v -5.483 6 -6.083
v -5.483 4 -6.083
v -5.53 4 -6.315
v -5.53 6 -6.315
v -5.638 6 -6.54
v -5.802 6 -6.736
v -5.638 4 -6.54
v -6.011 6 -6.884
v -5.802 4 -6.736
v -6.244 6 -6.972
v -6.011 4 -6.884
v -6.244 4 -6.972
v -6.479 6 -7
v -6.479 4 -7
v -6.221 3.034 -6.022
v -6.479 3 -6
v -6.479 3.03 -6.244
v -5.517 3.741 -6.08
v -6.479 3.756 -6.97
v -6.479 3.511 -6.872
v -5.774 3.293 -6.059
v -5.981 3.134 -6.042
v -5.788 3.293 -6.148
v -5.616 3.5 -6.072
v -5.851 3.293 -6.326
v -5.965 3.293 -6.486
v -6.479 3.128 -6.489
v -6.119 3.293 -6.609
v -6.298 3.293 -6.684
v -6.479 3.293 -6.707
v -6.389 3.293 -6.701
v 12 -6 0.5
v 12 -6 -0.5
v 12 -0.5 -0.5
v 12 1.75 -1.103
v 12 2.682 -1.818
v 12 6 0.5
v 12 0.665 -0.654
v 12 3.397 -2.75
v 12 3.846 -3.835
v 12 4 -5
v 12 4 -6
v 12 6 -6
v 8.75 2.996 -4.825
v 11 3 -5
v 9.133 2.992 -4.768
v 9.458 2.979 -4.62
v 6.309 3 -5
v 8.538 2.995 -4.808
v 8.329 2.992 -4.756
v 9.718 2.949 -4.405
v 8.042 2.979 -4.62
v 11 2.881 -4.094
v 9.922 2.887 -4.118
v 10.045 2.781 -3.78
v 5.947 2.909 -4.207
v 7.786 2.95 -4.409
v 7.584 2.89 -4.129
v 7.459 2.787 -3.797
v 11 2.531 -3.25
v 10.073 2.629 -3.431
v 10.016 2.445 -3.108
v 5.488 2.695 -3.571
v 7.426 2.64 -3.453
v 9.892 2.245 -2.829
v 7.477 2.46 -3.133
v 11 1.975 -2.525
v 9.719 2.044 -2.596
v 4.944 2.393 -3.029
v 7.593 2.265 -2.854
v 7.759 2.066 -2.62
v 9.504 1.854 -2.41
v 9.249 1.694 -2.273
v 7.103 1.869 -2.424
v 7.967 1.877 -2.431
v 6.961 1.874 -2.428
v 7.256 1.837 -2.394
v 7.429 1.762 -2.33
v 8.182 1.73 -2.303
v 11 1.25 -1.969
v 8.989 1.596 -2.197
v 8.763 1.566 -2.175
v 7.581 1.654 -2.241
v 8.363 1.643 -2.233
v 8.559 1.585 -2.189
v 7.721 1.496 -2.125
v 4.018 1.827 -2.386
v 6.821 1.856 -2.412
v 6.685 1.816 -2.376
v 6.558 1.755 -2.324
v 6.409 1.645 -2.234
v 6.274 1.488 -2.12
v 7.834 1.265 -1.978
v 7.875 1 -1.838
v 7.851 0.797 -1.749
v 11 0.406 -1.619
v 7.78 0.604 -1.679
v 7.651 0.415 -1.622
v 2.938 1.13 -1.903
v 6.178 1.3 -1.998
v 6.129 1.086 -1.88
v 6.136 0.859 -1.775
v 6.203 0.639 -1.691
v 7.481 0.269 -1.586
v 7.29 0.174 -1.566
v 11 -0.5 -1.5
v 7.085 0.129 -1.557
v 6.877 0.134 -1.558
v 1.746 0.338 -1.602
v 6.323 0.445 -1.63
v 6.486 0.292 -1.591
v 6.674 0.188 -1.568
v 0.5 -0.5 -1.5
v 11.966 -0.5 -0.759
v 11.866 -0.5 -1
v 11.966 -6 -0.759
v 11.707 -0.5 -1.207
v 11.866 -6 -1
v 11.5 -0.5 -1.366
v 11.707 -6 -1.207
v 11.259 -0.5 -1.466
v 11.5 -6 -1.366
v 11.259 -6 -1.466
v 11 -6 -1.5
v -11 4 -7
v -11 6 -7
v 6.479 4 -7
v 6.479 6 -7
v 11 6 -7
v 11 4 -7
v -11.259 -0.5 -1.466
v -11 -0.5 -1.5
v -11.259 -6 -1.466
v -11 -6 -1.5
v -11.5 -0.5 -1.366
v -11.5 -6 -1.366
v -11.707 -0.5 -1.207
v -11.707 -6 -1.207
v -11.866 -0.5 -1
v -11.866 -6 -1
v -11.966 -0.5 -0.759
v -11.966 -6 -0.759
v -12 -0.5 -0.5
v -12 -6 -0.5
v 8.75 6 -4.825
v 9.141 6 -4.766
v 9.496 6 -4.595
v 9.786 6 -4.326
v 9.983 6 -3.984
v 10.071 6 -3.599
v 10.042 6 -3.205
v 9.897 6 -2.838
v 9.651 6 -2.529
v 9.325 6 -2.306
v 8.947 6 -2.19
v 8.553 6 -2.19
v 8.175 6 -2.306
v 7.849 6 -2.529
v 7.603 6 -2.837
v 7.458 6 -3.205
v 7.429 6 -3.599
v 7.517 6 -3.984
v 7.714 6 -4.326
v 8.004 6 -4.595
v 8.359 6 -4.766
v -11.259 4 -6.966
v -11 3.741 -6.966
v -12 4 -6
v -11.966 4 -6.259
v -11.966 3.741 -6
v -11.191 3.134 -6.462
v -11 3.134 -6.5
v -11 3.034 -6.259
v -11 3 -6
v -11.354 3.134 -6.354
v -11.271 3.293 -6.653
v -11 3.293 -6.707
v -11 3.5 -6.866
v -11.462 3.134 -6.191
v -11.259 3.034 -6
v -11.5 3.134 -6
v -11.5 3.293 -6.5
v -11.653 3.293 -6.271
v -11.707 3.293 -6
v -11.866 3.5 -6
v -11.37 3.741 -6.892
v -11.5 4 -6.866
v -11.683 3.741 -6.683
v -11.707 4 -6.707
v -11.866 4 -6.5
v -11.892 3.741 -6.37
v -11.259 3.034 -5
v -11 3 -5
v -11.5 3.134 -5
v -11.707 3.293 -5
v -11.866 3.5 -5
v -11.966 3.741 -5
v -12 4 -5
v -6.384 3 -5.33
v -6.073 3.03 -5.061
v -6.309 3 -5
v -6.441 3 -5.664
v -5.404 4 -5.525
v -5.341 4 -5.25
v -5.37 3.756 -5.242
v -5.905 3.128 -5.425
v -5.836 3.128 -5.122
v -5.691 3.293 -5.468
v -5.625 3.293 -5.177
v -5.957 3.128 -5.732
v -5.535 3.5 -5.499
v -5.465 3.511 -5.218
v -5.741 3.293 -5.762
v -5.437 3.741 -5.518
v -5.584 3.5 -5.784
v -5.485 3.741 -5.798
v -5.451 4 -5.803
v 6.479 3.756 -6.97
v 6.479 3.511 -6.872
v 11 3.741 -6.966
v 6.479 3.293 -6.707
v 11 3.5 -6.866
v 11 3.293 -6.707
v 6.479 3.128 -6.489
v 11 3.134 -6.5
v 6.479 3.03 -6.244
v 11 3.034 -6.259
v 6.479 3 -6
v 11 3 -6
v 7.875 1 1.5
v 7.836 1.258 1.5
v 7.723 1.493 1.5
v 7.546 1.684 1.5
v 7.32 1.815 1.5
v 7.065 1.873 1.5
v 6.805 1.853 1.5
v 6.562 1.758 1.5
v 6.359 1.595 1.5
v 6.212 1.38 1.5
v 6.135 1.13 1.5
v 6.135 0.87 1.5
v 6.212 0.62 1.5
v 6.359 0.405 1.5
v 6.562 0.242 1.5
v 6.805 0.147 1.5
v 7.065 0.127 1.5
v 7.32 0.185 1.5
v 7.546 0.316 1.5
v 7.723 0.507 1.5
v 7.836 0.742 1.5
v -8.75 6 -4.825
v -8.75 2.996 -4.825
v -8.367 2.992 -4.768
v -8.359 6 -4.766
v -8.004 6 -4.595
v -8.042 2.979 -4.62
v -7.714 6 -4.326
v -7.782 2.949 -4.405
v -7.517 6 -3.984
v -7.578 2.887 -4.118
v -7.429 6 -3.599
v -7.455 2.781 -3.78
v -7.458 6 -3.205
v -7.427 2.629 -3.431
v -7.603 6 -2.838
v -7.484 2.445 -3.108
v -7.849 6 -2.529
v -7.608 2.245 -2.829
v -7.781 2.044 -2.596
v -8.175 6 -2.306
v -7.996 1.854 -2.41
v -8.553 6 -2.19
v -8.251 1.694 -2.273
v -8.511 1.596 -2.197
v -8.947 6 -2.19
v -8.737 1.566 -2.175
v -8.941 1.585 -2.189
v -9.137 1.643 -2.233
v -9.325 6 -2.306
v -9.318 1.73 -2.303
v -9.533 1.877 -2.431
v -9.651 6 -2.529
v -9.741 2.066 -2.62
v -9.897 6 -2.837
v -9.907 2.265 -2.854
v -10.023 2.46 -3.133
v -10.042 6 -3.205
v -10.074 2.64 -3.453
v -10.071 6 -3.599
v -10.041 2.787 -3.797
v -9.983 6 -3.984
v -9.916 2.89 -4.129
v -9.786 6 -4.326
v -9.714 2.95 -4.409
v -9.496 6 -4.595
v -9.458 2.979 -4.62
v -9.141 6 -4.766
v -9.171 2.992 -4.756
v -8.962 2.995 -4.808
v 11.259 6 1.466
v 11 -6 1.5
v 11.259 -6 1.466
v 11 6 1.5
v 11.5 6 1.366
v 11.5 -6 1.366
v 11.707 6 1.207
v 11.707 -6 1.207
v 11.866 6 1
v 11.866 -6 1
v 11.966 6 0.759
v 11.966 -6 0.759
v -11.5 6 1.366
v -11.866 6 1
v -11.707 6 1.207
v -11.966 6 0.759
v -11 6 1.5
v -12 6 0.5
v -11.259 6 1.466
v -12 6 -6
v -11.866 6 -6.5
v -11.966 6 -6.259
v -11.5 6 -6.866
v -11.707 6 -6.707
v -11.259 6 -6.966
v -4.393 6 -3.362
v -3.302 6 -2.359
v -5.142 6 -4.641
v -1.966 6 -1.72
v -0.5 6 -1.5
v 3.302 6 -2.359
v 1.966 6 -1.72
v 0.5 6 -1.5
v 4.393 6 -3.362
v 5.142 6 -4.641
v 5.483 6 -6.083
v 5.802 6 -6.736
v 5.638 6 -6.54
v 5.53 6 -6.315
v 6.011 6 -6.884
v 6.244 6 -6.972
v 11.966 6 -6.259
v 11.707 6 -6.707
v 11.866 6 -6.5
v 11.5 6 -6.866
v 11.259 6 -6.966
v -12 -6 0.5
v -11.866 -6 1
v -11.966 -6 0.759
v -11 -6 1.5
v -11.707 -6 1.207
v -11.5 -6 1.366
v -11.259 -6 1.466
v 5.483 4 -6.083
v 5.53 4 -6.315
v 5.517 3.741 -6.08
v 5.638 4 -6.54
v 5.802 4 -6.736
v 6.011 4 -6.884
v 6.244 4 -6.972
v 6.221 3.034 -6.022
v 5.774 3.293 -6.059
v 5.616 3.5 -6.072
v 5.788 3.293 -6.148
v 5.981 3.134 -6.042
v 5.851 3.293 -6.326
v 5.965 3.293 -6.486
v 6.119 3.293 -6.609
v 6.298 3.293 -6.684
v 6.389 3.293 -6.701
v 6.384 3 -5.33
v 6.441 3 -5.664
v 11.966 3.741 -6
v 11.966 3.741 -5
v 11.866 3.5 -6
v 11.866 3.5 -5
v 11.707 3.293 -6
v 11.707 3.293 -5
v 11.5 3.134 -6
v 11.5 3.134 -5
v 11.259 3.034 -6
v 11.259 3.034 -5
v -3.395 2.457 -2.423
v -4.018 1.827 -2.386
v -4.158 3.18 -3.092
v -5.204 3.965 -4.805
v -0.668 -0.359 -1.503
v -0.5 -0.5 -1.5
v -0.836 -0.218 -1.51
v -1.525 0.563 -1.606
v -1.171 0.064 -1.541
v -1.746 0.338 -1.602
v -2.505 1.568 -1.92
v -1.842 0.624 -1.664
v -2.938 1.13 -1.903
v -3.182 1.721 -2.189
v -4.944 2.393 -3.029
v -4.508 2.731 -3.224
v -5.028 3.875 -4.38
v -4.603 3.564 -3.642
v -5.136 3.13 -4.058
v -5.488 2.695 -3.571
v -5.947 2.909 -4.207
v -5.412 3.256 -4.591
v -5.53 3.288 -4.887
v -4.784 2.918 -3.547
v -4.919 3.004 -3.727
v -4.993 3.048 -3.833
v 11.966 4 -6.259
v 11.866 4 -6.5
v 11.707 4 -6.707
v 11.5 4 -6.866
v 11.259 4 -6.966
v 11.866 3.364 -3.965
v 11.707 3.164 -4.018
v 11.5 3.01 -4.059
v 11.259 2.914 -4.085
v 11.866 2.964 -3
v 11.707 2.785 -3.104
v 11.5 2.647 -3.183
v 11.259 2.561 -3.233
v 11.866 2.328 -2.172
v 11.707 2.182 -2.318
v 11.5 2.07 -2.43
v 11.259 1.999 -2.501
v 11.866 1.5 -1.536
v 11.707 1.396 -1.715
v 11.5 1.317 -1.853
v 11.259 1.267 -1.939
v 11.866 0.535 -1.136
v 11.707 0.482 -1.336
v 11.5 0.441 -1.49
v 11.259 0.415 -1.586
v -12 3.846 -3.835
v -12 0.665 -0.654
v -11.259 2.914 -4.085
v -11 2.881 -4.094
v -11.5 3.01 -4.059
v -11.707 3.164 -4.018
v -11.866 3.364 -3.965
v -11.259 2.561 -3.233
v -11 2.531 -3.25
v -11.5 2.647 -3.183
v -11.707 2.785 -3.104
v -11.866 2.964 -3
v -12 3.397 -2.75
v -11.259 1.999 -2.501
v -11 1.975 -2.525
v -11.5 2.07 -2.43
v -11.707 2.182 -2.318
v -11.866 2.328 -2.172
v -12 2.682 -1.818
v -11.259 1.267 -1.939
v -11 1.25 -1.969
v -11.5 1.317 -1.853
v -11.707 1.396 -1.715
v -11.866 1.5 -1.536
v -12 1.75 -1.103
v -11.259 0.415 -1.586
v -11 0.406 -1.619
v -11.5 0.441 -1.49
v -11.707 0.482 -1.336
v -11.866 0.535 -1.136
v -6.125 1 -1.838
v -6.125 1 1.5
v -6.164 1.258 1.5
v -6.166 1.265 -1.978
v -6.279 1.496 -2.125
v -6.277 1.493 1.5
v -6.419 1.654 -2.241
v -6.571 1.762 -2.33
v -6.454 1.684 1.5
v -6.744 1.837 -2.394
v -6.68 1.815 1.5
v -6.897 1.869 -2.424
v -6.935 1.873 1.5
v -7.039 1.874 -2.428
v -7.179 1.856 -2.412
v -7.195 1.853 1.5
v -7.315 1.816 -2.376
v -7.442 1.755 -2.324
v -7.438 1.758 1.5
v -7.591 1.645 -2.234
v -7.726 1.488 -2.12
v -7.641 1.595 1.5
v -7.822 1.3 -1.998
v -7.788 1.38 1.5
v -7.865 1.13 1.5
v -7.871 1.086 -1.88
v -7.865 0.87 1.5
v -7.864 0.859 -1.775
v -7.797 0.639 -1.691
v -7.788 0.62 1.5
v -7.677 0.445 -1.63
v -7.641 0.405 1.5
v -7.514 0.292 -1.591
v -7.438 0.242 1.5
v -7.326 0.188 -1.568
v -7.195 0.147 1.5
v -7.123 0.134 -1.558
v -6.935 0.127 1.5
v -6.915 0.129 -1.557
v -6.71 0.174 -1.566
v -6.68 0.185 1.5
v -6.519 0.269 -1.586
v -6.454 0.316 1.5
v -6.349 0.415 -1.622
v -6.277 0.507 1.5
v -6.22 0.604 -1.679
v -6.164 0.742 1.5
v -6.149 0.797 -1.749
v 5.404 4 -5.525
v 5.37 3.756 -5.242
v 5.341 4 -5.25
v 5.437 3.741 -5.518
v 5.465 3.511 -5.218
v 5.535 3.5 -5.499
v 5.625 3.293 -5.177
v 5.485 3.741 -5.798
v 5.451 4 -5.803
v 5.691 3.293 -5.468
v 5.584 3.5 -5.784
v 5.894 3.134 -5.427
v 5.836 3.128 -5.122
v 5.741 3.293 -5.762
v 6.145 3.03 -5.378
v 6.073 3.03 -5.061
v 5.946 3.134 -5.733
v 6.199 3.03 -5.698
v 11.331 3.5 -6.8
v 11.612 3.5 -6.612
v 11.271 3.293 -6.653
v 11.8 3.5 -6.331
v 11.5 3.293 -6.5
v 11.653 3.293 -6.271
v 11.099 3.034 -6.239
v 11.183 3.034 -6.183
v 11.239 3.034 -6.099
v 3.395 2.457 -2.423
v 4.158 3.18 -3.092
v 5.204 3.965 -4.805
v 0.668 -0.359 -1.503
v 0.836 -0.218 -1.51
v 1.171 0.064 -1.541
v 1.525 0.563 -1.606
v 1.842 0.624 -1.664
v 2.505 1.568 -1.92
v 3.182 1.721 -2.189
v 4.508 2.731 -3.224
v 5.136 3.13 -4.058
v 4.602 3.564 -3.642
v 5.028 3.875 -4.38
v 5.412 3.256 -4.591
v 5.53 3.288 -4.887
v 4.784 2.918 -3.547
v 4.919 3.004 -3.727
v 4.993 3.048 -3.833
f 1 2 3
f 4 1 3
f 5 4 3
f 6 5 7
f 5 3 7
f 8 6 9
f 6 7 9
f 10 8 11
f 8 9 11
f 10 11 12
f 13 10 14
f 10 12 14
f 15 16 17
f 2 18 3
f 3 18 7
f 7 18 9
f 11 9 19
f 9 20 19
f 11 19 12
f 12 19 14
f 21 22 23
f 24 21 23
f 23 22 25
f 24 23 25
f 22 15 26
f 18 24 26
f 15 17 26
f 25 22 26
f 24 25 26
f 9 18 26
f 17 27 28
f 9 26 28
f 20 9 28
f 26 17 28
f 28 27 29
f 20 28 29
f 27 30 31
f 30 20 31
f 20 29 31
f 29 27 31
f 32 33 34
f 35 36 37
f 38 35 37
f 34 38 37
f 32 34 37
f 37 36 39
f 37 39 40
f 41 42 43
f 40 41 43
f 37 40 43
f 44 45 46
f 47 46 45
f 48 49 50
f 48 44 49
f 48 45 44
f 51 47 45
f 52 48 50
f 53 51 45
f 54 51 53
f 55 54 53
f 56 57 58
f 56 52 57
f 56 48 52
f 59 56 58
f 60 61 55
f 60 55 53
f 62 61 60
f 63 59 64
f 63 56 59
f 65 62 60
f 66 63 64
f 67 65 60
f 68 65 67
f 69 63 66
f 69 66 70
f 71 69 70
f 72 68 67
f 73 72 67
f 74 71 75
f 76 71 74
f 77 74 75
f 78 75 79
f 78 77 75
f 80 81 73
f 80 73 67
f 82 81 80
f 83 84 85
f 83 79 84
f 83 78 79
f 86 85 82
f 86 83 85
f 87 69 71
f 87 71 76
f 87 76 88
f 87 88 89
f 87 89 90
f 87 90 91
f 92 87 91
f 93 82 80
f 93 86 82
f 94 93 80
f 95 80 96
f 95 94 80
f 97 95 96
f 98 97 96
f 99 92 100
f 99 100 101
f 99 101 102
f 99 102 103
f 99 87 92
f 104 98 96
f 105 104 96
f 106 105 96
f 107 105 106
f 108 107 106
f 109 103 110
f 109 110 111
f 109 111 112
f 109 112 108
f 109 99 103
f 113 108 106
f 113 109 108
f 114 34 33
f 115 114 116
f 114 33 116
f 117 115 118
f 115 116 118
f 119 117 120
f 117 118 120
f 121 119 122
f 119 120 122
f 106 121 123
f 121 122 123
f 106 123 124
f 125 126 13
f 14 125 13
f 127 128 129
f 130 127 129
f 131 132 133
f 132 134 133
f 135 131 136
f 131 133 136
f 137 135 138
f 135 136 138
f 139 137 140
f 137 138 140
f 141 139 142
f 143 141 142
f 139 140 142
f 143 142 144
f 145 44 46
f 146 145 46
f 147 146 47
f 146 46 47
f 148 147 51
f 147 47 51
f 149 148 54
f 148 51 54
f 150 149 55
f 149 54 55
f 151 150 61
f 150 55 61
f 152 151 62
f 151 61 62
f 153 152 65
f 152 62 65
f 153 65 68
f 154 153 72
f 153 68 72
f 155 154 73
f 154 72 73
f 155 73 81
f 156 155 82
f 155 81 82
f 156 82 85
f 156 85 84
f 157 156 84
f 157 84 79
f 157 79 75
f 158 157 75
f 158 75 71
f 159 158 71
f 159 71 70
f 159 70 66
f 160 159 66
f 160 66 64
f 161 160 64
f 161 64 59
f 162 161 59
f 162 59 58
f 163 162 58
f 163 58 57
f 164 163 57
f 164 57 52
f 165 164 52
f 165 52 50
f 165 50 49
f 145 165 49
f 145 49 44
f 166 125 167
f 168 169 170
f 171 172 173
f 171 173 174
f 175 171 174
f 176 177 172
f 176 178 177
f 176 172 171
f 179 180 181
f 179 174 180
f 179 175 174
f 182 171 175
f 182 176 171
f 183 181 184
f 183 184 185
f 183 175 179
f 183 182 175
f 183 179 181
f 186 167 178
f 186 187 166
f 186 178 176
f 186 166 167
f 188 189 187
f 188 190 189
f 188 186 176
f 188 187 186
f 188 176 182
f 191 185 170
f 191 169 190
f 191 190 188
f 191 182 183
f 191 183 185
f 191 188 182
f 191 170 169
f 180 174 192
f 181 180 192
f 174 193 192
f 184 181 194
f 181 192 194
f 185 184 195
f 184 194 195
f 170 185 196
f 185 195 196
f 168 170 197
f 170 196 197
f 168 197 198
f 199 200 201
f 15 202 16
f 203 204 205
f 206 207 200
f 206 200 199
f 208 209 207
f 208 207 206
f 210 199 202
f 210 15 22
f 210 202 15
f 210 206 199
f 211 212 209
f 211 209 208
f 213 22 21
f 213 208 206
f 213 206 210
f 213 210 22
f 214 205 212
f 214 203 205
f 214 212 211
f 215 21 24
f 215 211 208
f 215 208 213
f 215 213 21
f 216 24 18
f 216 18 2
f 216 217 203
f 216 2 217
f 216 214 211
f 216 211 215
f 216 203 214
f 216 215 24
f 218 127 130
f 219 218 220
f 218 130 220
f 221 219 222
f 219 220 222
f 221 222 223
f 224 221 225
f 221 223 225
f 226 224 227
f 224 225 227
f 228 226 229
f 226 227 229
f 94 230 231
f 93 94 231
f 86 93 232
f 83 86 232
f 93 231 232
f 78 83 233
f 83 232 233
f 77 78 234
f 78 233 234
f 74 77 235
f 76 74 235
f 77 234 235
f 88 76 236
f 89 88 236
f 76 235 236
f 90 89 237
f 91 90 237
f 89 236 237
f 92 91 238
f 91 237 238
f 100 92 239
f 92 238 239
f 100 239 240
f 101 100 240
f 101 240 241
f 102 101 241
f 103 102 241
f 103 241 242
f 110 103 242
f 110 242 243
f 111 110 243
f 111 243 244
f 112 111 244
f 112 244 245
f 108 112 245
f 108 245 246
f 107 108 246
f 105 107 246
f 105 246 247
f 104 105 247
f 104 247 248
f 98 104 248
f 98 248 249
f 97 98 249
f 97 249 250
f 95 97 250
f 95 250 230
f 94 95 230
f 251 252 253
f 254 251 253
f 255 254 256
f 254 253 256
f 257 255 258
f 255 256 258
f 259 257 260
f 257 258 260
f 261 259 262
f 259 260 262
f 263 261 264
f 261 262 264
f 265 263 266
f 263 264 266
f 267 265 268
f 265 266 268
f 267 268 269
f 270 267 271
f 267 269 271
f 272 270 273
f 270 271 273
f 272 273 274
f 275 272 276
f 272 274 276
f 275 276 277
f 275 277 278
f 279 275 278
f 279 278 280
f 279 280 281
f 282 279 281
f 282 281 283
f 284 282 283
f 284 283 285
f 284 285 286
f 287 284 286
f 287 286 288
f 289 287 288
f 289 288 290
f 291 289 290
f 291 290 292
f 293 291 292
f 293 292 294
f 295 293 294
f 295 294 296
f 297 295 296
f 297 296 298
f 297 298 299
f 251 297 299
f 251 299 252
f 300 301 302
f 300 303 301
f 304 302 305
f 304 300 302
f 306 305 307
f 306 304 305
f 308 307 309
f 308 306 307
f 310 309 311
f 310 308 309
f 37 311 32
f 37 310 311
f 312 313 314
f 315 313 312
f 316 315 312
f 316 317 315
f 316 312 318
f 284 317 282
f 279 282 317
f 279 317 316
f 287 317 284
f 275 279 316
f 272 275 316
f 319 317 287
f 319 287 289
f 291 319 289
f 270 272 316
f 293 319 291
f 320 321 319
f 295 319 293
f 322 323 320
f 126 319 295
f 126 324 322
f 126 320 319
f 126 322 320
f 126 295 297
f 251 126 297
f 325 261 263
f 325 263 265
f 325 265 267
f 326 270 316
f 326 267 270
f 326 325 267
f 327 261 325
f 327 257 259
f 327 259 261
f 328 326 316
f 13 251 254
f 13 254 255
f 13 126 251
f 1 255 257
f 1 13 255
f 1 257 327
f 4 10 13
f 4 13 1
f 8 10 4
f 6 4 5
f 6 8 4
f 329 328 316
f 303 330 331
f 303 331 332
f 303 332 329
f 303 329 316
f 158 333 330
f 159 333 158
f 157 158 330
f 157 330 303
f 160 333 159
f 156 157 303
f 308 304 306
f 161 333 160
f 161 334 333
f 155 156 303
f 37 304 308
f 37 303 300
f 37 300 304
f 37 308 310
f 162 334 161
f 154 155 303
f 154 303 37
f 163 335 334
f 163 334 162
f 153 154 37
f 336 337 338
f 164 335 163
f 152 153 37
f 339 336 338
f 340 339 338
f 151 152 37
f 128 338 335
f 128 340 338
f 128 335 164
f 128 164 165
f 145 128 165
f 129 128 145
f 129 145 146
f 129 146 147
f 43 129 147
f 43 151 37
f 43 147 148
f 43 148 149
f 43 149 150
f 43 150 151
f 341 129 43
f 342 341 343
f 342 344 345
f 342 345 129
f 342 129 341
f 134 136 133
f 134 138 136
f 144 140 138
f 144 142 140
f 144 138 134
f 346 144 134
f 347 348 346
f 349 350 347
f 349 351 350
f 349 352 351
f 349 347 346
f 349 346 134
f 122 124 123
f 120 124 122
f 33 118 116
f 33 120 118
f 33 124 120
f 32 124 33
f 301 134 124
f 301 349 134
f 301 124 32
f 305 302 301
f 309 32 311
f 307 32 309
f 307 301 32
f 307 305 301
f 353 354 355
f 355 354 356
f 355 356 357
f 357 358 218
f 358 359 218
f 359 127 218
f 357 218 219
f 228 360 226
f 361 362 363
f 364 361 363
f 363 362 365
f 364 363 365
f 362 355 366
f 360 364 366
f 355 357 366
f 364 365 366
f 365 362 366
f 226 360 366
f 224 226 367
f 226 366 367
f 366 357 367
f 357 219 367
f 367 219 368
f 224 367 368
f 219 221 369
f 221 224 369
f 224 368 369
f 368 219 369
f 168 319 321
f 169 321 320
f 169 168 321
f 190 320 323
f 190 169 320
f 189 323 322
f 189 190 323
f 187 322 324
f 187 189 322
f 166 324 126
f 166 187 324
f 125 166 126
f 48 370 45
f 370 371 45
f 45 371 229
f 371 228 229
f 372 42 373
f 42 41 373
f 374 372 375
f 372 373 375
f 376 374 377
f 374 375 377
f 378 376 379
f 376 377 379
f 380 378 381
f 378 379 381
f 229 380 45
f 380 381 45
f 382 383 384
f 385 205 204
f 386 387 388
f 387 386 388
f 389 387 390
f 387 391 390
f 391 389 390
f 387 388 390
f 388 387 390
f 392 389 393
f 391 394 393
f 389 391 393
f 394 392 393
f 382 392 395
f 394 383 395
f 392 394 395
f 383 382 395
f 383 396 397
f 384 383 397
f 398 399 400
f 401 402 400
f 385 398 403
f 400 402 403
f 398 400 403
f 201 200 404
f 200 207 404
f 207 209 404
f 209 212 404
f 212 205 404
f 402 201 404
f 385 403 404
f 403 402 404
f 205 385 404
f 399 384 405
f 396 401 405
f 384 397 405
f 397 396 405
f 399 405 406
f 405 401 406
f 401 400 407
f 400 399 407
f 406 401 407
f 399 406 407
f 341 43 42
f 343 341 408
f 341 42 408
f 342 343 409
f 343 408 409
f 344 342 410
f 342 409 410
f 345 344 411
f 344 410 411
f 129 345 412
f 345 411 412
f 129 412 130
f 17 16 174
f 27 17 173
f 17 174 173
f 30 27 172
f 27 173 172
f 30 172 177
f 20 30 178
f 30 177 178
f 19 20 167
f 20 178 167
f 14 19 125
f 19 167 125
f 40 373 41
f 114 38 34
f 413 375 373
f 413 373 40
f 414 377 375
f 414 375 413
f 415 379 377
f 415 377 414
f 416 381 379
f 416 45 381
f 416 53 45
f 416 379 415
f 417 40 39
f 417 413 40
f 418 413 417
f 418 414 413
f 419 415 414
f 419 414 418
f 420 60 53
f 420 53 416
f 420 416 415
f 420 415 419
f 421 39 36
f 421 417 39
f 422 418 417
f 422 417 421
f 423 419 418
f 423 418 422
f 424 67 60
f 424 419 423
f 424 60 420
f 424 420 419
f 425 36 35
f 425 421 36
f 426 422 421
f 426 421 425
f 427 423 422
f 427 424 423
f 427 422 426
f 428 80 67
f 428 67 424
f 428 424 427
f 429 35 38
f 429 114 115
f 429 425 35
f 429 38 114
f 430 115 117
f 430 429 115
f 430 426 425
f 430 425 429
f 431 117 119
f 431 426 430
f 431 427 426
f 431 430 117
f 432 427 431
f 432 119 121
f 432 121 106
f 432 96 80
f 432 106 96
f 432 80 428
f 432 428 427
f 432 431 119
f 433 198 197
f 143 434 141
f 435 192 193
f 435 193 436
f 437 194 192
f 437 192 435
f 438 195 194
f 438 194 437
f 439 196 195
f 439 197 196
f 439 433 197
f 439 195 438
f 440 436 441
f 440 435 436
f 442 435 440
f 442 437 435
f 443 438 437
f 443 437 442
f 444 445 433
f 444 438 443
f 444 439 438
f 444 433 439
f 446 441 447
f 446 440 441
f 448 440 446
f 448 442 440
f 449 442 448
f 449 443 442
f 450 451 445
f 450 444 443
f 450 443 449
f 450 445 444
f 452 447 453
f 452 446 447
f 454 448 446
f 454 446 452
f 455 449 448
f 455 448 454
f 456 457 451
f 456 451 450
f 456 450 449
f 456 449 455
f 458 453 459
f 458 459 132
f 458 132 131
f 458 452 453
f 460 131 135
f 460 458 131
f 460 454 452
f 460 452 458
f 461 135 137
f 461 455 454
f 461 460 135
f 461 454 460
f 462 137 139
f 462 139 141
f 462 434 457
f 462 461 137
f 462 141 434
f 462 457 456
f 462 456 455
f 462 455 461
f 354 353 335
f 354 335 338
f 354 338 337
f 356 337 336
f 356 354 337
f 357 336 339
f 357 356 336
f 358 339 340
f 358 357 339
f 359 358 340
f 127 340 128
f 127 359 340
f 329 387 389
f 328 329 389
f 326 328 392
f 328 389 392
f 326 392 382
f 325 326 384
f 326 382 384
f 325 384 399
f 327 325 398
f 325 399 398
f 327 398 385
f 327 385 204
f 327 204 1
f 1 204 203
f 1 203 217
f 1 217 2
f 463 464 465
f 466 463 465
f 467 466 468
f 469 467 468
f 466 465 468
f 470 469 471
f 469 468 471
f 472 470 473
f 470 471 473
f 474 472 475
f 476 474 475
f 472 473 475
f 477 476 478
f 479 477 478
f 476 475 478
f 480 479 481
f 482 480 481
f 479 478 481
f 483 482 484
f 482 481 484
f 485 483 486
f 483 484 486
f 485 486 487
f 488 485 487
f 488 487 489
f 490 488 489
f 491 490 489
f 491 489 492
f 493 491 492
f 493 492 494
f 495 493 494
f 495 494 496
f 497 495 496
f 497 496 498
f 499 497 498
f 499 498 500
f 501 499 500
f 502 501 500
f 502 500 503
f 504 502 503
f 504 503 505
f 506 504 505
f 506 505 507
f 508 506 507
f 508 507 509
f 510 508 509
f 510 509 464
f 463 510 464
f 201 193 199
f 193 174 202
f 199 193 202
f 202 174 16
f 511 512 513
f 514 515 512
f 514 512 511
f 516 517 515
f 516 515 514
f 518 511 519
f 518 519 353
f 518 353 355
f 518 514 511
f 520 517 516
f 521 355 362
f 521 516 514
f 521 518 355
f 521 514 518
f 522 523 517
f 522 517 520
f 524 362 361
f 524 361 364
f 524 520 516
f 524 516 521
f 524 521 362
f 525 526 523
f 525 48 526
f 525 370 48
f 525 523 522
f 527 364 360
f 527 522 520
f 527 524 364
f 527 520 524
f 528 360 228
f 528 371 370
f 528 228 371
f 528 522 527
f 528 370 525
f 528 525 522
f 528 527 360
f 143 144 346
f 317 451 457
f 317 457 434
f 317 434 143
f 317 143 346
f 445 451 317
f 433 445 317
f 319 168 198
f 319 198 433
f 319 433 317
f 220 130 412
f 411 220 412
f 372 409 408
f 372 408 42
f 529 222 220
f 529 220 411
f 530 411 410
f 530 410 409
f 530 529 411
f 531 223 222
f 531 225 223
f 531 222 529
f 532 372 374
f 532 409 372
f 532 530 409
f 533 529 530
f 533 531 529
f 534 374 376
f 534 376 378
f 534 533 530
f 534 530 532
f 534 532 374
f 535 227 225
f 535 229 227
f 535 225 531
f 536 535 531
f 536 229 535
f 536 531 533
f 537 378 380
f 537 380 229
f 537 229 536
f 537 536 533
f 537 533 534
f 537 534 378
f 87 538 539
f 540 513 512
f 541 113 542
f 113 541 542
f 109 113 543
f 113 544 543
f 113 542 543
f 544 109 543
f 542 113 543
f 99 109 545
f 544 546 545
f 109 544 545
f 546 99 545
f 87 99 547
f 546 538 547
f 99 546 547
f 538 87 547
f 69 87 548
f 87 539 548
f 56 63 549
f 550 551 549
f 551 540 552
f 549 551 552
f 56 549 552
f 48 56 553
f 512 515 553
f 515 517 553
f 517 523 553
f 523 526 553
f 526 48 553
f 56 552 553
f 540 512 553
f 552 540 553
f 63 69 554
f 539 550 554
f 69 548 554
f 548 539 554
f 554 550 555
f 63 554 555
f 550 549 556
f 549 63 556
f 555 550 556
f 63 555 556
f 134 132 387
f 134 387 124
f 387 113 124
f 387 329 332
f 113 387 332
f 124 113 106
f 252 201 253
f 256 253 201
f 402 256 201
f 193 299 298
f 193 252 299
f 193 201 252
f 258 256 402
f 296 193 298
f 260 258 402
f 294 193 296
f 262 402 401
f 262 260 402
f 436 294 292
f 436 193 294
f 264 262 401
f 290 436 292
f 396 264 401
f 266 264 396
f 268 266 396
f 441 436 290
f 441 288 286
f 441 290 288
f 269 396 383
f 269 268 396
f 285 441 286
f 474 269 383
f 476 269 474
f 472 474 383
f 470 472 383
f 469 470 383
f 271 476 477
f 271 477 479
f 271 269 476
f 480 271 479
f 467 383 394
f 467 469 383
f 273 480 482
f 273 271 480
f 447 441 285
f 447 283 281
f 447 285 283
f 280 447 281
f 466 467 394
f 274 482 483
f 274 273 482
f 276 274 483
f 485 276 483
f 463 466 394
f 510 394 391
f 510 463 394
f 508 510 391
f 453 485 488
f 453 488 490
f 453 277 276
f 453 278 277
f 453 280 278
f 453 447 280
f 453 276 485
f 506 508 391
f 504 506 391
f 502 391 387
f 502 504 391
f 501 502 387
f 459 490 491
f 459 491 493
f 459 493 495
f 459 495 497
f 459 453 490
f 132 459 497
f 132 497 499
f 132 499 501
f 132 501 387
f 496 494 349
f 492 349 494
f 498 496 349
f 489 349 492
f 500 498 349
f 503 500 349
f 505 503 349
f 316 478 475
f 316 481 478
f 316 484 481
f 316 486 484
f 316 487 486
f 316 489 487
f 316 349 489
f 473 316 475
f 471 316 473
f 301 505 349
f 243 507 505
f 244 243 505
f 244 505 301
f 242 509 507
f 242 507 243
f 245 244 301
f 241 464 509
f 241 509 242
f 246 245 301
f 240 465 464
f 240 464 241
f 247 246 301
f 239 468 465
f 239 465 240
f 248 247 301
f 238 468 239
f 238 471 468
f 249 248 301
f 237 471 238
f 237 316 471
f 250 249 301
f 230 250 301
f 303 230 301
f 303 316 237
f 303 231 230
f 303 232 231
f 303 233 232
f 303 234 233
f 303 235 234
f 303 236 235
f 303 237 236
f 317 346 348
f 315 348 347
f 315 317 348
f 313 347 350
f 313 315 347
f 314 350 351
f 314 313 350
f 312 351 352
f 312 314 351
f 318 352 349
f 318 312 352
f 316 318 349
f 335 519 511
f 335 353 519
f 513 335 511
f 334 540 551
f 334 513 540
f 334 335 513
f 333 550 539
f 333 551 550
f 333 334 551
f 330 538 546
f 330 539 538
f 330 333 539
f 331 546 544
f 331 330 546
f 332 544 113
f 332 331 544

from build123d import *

# Parameters (mm, degrees)
SKETCH1_W           = 24
SKETCH1_H           = 12
BOSS_EXTRUDE1_DEPTH = 1.5
SKETCH2_W           = 6.5
SKETCH2_H           = 5.5
BOSS_EXTRUDE2_DEPTH = 3
SKETCH6_R           = 1.325
CUT_EXTRUDE1_DEPTH  = 17.552945357
SKETCH7_R           = 1.325
CUT_EXTRUDE2_DEPTH  = 17.552945357
FILLET1_R           = 3.5
FILLET2_R           = 5
FILLET3_R           = 1
FILLET5_R           = 1
SKETCH8_R           = 0.875
CUT_EXTRUDE4_DEPTH  = 16.882380341


# Some blends are built 0.0001 mm under size
with BuildPart() as part:
    # Sketch1 → Boss-Extrude1 (new, symmetric)
    with BuildSketch(Plane.XY):
        Rectangle(SKETCH1_W, SKETCH1_H)
    extrude(amount=BOSS_EXTRUDE1_DEPTH, both=True)

    # Sketch2 → Boss-Extrude2 (add)
    with BuildSketch(Plane(origin=(0, 6, 0), x_dir=(1, 0, 0), z_dir=(0, 1, 0))):
        with Locations((8.75, 4.25)):
            Rectangle(SKETCH2_W, SKETCH2_H)
        with Locations((-8.75, 4.25)):
            Rectangle(SKETCH2_W, SKETCH2_H)
    extrude(amount=-BOSS_EXTRUDE2_DEPTH)

    # Sketch6 → Cut-Extrude1 (cut, through all)
    with BuildSketch(Plane.XZ.offset(-3)):
        with Locations(Location((-8.75, -3.5, 0), (0, 0, 270))):
            Circle(SKETCH6_R)
    extrude(amount=-CUT_EXTRUDE1_DEPTH, mode=Mode.SUBTRACT)

    # Sketch7 → Cut-Extrude2 (cut, through all)
    with BuildSketch(Plane.XZ.offset(-3)):
        with Locations(Location((8.75, -3.5, 0), (0, 0, 270))):
            Circle(SKETCH7_R)
    extrude(amount=-CUT_EXTRUDE2_DEPTH, mode=Mode.SUBTRACT)

    # Fillet1
    # the kernel refuses this fillet: 3.5 mm, written as the material it adds along each edge
    with BuildSketch(Plane(origin=(5.5, 3, -1.5), x_dir=(0, -1, 0), z_dir=(1, 0, 0))) as fillet1_piece_1_section:
        with BuildLine():
            CenterArc((FILLET1_R, FILLET1_R), FILLET1_R, 180, 90)
            Line((0, FILLET1_R), (0, 0))
            Line((0, 0), (FILLET1_R, 0))
        make_face()
    fillet1_piece_1 = extrude(amount=6.5, mode=Mode.PRIVATE)
    fillet1_piece_1 = fillet1_piece_1 - Plane(origin=(8.75, 2.130609202, -3.5), x_dir=(0, 0, -1), z_dir=(0, -1, 0)) * Cylinder(1.325, 27, mode=Mode.PRIVATE)
    add(fillet1_piece_1)
    with BuildSketch(Plane(origin=(-12, 3, -1.5), x_dir=(0, -1, 0), z_dir=(1, 0, 0))) as fillet1_piece_2_section:
        with BuildLine():
            CenterArc((FILLET1_R, FILLET1_R), FILLET1_R, 180, 90)
            Line((0, FILLET1_R), (0, 0))
            Line((0, 0), (FILLET1_R, 0))
        make_face()
    fillet1_piece_2 = extrude(amount=6.5, mode=Mode.PRIVATE)
    fillet1_piece_2 = fillet1_piece_2 - Plane(origin=(-8.75, 2.130609202, -3.5), x_dir=(0, 0, -1), z_dir=(0, -1, 0)) * Cylinder(1.325, 27, mode=Mode.PRIVATE)
    add(fillet1_piece_2)

    # Fillet2
    fillet2_edges = [part.edges().sort_by_distance(p)[0] for p in [
        (5.5, 2.75, -1.5),
        (-5.5, 2.75, -1.5),
    ]]
    fillet(fillet2_edges, radius=FILLET2_R)

    # Fillet3
    fillet3_edges = [part.edges().sort_by_distance(p)[0] for p in [
        (12, 4.5, -7),
        (-12, 4.5, -7),
        (5.5, 4.5, -7),
        (-5.5, 4.5, -7),
    ]]
    fillet(fillet3_edges, radius=FILLET3_R)

    # Fillet5
    fillet5_edges = [part.edges().sort_by_distance(p)[0] for p in [
        (8.739565186, 3, -7),
        (11.707106781, 3, -6.707106781),
        (5.802129531, 3, -6.735982243),
        (-5.406145562, 3, -5.535771954),
        (-8.739565186, 3, -7),
        (-11.707106781, 3, -6.707106781),
        (-5.802129531, 3, -6.735982243),
        (-12, 0, 1.5),
        (12, 0, 1.5),
        (12, 3, -5.5),
        (-12, -3.25, -1.5),
        (-12, 3, -5.5),
        (12, 1.974873734, -2.525126266),
        (-12, 1.974873734, -2.525126266),
        (12, -3.25, -1.5),
        (3.087209053, 1.628244963, -2.221408019),
        (5.406145562, 3, -5.535771954),
        (-3.087209053, 1.628244963, -2.221408019),
    ]]
    fillet(fillet5_edges, radius=FILLET5_R - 0.0004)  # a hair under: the kernel refuses the full size

    # Sketch8 → Cut-Extrude4 (cut, through all)
    with BuildSketch(Plane.XY.offset(1.5)):
        with Locations((7, 1)):
            Circle(SKETCH8_R)
        with Locations((-7, 1)):
            Circle(SKETCH8_R)
    extrude(amount=-CUT_EXTRUDE4_DEPTH, mode=Mode.SUBTRACT)


solid = part.part
